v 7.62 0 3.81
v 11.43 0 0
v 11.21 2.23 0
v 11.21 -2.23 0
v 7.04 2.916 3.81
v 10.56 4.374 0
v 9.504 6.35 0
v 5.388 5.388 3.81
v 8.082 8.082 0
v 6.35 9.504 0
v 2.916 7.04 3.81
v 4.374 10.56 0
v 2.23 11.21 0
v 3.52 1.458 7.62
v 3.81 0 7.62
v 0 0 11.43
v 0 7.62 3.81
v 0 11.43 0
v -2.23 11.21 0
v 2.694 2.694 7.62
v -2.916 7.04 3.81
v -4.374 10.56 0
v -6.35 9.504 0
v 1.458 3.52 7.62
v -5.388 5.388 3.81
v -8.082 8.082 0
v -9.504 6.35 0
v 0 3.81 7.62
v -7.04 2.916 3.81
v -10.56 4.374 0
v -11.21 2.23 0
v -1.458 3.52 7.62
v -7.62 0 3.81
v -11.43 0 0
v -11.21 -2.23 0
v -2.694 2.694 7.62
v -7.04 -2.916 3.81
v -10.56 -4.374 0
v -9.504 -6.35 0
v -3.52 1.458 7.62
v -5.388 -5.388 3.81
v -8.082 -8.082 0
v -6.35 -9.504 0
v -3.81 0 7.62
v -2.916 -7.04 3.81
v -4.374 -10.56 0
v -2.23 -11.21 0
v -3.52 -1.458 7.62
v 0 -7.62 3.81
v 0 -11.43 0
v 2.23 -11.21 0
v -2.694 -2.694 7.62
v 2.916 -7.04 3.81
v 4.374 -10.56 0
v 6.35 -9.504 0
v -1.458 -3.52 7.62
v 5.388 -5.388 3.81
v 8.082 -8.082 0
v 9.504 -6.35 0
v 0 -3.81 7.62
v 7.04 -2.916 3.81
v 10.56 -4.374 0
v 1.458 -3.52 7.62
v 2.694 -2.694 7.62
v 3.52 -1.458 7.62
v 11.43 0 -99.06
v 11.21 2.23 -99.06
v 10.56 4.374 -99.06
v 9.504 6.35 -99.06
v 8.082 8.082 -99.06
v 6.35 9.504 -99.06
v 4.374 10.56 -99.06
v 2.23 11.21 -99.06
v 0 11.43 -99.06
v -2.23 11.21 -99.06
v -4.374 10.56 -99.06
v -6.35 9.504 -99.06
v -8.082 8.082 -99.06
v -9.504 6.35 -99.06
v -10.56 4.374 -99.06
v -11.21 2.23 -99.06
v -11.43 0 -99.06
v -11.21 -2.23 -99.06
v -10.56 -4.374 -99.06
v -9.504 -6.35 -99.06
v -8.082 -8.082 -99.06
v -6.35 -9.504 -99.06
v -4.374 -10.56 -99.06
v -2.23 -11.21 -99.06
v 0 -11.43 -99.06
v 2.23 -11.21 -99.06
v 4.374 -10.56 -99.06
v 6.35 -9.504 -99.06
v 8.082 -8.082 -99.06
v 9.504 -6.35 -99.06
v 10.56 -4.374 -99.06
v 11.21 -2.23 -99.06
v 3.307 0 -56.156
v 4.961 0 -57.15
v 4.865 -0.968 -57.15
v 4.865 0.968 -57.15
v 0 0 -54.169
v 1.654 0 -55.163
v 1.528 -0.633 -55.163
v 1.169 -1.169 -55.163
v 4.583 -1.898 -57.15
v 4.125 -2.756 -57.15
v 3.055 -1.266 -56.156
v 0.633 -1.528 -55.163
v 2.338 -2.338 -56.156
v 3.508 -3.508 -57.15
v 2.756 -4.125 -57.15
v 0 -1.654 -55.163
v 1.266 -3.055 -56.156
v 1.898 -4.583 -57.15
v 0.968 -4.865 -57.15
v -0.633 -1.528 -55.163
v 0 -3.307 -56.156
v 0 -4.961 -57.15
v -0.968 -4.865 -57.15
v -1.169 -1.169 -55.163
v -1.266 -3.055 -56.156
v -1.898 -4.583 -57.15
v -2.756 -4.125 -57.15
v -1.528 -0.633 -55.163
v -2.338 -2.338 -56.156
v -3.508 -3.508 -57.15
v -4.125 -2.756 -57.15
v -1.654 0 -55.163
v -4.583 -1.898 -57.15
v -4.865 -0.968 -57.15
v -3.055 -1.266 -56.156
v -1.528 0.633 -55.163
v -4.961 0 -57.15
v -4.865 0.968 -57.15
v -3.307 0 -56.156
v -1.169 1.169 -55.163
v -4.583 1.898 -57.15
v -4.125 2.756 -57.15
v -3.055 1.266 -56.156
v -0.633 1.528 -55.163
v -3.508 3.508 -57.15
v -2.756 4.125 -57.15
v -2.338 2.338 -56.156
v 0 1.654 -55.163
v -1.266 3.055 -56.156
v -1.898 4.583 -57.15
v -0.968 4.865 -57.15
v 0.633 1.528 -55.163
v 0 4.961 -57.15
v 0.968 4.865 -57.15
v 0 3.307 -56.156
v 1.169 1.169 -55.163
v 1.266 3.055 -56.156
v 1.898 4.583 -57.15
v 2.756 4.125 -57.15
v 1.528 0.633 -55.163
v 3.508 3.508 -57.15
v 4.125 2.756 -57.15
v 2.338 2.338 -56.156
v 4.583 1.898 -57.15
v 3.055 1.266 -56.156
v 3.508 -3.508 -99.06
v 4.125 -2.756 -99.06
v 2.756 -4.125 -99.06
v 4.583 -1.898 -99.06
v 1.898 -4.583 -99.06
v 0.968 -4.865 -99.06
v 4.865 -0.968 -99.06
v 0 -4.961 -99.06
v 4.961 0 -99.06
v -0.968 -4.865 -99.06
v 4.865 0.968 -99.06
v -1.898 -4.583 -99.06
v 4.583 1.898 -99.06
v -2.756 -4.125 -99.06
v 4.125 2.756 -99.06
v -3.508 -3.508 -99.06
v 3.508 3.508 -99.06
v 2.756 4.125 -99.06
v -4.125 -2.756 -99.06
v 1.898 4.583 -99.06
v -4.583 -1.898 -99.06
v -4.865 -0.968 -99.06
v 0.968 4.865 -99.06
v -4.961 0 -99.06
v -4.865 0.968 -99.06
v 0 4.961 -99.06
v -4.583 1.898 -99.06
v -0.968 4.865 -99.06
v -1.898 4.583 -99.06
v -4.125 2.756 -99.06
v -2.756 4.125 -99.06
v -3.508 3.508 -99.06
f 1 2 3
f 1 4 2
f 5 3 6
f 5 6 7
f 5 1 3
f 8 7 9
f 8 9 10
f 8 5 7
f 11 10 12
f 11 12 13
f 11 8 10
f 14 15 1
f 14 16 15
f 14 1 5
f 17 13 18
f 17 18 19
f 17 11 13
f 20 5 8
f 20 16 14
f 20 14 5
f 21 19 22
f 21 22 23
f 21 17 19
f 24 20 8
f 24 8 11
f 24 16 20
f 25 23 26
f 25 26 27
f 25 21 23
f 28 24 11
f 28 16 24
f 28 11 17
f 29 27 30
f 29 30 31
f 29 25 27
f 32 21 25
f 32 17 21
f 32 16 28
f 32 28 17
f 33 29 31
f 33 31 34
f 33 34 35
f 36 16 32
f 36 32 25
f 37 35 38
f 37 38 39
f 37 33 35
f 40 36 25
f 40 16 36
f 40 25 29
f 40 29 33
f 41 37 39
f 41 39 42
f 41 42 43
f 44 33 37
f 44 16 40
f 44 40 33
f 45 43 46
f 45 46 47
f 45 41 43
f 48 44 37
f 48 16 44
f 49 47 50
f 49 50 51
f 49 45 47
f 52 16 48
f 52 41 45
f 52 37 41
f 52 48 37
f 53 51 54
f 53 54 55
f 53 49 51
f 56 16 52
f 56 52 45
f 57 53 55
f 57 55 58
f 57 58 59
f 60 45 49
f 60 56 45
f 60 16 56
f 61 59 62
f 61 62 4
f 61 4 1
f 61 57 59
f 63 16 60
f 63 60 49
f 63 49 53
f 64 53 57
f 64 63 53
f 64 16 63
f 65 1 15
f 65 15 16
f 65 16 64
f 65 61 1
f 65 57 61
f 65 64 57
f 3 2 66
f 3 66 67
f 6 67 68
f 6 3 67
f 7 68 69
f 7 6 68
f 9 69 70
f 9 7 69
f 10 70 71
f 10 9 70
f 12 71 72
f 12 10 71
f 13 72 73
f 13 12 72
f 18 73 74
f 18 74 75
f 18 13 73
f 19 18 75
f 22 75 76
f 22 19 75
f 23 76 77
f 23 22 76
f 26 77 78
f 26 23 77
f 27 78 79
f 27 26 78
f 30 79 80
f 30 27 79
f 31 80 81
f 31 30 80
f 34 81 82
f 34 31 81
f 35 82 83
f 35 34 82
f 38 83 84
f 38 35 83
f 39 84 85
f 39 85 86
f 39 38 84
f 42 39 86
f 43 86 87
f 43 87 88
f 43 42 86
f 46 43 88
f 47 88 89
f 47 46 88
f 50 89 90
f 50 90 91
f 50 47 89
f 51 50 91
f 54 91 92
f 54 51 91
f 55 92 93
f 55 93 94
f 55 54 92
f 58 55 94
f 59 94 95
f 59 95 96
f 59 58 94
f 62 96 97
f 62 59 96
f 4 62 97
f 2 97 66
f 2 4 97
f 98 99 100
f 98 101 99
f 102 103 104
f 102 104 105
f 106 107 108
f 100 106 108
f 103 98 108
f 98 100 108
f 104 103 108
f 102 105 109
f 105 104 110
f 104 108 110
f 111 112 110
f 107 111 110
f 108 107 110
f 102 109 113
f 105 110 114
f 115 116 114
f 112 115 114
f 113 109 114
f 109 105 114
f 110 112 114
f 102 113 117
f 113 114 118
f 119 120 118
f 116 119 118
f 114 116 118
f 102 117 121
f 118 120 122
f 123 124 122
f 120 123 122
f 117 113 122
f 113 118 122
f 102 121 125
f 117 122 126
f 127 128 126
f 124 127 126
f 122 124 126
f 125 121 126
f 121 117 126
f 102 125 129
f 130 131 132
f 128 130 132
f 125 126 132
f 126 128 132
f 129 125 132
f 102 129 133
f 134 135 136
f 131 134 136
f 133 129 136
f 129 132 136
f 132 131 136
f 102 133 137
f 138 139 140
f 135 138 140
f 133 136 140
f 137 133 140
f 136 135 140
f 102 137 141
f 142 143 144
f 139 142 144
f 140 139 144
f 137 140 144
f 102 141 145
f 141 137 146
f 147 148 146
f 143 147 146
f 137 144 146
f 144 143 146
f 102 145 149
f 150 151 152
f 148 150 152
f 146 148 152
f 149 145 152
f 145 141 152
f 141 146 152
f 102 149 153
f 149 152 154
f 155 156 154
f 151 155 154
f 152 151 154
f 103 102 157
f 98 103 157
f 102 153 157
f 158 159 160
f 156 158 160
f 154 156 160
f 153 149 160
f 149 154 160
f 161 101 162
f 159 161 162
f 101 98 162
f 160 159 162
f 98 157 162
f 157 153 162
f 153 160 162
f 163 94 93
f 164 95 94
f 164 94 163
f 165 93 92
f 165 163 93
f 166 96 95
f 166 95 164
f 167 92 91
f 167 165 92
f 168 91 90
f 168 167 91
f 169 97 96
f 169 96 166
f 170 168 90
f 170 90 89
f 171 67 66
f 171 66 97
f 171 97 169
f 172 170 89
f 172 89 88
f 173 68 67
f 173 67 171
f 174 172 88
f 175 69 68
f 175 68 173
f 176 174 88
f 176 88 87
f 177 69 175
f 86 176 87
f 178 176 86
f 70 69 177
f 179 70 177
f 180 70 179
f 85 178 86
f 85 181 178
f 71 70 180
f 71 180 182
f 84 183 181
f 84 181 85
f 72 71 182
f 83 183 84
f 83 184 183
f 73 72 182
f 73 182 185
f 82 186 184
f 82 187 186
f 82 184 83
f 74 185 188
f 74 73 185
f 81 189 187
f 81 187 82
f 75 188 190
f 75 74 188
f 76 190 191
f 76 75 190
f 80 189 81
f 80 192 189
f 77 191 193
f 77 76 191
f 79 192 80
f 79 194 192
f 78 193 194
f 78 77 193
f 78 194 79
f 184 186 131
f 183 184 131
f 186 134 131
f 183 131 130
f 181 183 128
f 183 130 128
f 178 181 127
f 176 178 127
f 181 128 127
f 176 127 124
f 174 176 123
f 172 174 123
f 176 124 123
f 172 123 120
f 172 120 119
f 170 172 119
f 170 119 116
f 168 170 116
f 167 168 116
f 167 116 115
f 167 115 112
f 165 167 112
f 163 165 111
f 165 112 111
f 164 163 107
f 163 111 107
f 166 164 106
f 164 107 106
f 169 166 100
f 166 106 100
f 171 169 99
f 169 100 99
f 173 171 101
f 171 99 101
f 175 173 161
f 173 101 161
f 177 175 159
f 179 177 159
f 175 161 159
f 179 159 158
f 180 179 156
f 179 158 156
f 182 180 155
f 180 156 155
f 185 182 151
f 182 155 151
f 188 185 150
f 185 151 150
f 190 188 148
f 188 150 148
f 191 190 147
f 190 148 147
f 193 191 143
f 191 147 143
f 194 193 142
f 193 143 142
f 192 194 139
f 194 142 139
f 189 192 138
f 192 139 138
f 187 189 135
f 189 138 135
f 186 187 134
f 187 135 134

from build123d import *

# Parameters (mm, degrees)
F2_DEPTH = 99.06
F4_D     = 9.92124
F4_DEPTH = 41.91
F4_TIP   = 2.980641204


with BuildPart() as f1:
    # F0 (on Front) → F1 (revolve)
    with BuildSketch(Plane.XZ):
        Polygon((0, 11.43), (0, 0), (11.43, 0), align=None)
    revolve(axis=Axis((0, 0, 5.715), (0, 0, 1)))

    # F2 (add): a face of the model
    f2_faces = [f1.faces().sort_by_distance(p)[0] for p in [
        (0, 0, 0),
    ]]
    extrude(f2_faces, amount=F2_DEPTH)

    # F4
    with Locations(Plane(origin=(0, 0, -99.06), x_dir=(1, 0, 0), z_dir=(0, 0, -1))):
        with Locations((0, 0)):
            Hole(F4_D / 2, depth=F4_DEPTH)
            with Locations((0, 0, -(F4_DEPTH + F4_TIP / 2))):  # 118° drill point
                Cone(0, F4_D / 2, F4_TIP, mode=Mode.SUBTRACT)


solid = f1.part
